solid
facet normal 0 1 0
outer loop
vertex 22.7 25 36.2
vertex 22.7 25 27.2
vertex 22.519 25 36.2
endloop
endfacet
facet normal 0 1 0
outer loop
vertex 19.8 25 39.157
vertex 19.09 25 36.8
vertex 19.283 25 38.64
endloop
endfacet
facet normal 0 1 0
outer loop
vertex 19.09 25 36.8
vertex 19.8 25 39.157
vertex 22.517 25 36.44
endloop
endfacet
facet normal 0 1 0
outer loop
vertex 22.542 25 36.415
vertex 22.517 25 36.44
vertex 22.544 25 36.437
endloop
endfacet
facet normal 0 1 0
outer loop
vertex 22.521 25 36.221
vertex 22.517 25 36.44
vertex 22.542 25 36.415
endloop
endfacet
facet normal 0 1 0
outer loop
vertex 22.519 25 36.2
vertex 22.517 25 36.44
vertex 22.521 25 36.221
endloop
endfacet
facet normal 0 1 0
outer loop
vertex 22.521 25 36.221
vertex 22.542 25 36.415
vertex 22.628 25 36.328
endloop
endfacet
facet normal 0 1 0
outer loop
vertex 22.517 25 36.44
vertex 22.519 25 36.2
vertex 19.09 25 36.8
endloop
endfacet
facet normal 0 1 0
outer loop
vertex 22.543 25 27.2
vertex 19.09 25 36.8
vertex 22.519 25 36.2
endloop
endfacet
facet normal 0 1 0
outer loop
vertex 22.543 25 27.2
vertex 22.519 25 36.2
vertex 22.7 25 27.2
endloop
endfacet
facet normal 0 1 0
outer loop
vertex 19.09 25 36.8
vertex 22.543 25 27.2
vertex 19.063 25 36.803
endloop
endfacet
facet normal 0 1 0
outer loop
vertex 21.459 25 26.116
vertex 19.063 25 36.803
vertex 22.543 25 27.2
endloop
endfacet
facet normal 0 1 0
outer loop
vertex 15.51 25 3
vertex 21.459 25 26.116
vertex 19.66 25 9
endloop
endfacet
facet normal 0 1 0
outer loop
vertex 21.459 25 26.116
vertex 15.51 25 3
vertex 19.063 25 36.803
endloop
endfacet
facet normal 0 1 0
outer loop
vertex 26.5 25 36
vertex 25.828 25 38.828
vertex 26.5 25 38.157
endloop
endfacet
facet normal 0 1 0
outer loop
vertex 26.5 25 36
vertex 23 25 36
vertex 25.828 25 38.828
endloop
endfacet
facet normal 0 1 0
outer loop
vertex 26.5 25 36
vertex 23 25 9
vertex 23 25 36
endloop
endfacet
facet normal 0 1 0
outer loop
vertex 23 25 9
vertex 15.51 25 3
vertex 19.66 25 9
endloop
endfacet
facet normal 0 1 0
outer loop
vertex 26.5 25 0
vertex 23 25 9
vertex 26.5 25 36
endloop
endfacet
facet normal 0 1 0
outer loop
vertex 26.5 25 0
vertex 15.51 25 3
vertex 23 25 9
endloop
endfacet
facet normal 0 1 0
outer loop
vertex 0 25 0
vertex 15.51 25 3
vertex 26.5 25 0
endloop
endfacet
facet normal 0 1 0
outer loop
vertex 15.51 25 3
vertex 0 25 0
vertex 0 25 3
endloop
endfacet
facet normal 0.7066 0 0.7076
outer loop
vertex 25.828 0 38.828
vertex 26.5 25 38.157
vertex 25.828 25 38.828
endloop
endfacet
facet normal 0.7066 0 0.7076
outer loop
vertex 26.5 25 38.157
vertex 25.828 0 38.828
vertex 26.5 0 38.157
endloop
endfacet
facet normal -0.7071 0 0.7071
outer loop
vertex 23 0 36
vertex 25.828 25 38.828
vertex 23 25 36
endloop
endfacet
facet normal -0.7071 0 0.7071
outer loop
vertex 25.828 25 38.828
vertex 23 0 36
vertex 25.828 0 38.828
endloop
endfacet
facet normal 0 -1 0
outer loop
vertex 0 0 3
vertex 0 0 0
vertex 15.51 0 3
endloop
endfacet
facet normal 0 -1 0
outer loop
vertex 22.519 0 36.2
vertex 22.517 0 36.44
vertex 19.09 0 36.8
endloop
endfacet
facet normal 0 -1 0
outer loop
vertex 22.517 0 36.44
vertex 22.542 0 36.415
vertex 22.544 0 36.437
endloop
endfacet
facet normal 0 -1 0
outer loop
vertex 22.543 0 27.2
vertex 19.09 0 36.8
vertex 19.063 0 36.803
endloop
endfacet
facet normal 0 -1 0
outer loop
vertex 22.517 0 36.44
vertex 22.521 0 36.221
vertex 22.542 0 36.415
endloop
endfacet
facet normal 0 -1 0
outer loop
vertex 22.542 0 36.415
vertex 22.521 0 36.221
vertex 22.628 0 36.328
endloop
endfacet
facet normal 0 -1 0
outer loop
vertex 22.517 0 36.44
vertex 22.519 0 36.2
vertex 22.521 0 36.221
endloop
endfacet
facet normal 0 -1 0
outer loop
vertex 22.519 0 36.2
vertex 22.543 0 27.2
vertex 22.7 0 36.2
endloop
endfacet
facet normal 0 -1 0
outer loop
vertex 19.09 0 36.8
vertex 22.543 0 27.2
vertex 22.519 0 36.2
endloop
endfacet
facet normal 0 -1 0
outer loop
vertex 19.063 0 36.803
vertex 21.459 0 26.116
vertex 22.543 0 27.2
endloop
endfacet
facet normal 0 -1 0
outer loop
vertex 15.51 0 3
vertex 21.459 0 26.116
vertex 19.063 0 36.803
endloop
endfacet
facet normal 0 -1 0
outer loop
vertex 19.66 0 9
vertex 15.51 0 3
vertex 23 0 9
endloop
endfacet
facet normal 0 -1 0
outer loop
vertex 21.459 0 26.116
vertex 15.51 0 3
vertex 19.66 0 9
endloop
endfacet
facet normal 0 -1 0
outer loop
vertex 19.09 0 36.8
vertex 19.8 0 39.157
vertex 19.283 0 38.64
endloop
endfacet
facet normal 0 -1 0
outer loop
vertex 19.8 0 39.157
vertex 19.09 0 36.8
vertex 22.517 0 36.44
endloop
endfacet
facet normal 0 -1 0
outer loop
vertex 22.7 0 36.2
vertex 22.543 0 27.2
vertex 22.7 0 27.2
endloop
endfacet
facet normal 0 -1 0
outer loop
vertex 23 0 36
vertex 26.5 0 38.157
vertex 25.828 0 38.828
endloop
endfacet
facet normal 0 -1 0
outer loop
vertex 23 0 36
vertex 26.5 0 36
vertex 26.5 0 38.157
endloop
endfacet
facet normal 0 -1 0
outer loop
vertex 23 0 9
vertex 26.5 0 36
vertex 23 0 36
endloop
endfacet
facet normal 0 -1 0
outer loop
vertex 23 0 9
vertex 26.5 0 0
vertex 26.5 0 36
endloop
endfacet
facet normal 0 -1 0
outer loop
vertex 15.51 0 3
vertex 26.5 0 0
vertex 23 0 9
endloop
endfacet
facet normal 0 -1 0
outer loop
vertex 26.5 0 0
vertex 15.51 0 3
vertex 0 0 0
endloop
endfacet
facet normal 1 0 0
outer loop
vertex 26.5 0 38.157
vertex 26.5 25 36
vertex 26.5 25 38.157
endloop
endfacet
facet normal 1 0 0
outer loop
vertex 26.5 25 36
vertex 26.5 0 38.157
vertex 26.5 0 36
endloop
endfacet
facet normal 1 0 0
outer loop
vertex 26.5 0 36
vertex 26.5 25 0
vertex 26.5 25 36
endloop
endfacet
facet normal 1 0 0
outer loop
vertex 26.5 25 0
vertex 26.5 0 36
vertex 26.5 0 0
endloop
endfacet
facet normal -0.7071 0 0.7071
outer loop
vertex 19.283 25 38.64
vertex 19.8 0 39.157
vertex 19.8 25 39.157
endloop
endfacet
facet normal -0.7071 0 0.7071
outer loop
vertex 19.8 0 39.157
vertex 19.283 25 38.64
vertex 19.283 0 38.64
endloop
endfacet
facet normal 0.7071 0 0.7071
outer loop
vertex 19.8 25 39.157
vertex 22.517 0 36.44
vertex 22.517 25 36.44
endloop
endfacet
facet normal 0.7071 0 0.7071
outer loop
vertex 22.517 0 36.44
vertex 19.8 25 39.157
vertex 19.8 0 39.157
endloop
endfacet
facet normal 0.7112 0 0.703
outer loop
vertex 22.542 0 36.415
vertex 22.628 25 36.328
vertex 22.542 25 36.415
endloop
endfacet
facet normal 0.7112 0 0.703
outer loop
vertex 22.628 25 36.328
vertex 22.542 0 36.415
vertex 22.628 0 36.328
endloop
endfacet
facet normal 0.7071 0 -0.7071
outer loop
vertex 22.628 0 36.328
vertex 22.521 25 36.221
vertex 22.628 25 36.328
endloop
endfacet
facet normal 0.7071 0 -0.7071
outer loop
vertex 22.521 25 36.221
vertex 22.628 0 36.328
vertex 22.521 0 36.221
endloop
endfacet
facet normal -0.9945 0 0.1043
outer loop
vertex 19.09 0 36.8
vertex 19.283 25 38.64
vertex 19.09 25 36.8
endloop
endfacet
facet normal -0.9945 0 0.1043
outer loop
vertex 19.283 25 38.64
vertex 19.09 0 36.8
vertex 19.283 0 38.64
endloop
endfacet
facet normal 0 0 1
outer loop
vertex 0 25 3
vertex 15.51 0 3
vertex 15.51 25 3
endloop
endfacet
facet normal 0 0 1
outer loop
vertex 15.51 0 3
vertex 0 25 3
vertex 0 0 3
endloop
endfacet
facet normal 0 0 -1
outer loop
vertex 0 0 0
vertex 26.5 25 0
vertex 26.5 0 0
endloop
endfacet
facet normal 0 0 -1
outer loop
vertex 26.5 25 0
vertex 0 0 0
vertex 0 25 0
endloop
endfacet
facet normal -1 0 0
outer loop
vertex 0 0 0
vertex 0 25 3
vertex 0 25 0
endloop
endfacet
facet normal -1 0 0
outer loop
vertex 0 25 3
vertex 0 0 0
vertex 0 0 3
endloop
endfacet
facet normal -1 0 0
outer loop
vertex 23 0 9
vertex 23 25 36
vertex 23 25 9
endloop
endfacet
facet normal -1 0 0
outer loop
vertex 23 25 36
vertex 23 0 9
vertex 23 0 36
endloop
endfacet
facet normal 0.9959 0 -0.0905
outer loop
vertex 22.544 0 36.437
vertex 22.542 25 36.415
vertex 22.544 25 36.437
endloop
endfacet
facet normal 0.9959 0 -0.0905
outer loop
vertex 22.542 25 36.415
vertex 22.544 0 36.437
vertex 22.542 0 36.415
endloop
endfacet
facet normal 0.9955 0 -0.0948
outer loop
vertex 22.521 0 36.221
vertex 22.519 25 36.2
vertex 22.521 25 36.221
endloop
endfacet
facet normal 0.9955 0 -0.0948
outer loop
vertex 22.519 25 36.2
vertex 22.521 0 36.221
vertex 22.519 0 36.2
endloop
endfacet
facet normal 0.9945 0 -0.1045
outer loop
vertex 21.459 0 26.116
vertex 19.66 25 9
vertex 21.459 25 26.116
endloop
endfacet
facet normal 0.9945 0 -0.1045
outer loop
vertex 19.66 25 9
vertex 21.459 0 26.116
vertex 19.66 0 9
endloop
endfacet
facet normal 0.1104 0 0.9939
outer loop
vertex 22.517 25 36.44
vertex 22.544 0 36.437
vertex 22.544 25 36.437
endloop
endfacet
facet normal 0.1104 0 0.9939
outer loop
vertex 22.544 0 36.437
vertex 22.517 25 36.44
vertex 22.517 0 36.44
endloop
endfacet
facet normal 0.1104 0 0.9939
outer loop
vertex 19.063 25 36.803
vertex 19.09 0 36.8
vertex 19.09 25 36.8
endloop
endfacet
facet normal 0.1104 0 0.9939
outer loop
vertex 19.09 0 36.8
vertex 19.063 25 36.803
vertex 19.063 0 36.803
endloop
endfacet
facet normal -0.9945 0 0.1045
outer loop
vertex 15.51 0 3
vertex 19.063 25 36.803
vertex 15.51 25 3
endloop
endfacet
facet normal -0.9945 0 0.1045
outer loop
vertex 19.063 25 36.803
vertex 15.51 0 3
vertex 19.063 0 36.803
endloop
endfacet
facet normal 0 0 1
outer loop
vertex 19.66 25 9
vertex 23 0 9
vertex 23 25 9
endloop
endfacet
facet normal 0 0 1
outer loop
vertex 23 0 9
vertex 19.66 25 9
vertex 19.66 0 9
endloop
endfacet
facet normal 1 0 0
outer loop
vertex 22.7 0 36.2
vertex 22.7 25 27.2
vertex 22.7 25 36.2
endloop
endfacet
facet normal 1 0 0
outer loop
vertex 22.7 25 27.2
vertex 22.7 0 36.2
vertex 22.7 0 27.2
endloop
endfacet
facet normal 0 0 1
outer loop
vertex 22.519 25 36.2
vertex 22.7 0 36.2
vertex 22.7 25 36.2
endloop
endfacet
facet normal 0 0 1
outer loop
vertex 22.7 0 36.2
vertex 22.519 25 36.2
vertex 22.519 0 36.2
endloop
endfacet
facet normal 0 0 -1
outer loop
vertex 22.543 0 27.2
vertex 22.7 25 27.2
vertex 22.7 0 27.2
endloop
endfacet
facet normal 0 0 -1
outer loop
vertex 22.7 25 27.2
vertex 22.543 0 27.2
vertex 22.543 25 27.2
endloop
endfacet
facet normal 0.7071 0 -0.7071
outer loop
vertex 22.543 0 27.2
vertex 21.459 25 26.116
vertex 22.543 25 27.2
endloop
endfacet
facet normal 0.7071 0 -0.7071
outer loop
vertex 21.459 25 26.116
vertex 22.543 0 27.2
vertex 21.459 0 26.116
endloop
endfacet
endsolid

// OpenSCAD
// Base
cube([25, 25, 3]);

// Bottom Fork
translate([23, 0, 0])
cube([3.5, 25, 36]);

difference(){    
    translate([23, 0, 36])
    rotate([0, 45, 0])
    cube([4, 25, 4]);
    
    translate([26.5, 0, 0])
    cube([4, 25, 50]);
}

// Top Fork
translate([15.3, 0, 1])
rotate([0, 6, 0])
cube([3.5, 25, 36]);

difference(){    
    translate([19.8, 0, 33.5])
    rotate([0, -45, 0])
    cube([4, 25, 4]);
    
    translate([11.2, 0, 0])
    rotate([0, 6, 0])
    cube([4, 25, 50]);
}

// Fork Brace
translate([17, 0, 0])
cube([8, 25, 9]);

// Top Fork Clip
translate([19.7, 0, 27.2])
cube([3, 25, 9]);

translate([18.3, 0, 27.2])
rotate([0, 45, 0])
cube([3, 25, 3]);
